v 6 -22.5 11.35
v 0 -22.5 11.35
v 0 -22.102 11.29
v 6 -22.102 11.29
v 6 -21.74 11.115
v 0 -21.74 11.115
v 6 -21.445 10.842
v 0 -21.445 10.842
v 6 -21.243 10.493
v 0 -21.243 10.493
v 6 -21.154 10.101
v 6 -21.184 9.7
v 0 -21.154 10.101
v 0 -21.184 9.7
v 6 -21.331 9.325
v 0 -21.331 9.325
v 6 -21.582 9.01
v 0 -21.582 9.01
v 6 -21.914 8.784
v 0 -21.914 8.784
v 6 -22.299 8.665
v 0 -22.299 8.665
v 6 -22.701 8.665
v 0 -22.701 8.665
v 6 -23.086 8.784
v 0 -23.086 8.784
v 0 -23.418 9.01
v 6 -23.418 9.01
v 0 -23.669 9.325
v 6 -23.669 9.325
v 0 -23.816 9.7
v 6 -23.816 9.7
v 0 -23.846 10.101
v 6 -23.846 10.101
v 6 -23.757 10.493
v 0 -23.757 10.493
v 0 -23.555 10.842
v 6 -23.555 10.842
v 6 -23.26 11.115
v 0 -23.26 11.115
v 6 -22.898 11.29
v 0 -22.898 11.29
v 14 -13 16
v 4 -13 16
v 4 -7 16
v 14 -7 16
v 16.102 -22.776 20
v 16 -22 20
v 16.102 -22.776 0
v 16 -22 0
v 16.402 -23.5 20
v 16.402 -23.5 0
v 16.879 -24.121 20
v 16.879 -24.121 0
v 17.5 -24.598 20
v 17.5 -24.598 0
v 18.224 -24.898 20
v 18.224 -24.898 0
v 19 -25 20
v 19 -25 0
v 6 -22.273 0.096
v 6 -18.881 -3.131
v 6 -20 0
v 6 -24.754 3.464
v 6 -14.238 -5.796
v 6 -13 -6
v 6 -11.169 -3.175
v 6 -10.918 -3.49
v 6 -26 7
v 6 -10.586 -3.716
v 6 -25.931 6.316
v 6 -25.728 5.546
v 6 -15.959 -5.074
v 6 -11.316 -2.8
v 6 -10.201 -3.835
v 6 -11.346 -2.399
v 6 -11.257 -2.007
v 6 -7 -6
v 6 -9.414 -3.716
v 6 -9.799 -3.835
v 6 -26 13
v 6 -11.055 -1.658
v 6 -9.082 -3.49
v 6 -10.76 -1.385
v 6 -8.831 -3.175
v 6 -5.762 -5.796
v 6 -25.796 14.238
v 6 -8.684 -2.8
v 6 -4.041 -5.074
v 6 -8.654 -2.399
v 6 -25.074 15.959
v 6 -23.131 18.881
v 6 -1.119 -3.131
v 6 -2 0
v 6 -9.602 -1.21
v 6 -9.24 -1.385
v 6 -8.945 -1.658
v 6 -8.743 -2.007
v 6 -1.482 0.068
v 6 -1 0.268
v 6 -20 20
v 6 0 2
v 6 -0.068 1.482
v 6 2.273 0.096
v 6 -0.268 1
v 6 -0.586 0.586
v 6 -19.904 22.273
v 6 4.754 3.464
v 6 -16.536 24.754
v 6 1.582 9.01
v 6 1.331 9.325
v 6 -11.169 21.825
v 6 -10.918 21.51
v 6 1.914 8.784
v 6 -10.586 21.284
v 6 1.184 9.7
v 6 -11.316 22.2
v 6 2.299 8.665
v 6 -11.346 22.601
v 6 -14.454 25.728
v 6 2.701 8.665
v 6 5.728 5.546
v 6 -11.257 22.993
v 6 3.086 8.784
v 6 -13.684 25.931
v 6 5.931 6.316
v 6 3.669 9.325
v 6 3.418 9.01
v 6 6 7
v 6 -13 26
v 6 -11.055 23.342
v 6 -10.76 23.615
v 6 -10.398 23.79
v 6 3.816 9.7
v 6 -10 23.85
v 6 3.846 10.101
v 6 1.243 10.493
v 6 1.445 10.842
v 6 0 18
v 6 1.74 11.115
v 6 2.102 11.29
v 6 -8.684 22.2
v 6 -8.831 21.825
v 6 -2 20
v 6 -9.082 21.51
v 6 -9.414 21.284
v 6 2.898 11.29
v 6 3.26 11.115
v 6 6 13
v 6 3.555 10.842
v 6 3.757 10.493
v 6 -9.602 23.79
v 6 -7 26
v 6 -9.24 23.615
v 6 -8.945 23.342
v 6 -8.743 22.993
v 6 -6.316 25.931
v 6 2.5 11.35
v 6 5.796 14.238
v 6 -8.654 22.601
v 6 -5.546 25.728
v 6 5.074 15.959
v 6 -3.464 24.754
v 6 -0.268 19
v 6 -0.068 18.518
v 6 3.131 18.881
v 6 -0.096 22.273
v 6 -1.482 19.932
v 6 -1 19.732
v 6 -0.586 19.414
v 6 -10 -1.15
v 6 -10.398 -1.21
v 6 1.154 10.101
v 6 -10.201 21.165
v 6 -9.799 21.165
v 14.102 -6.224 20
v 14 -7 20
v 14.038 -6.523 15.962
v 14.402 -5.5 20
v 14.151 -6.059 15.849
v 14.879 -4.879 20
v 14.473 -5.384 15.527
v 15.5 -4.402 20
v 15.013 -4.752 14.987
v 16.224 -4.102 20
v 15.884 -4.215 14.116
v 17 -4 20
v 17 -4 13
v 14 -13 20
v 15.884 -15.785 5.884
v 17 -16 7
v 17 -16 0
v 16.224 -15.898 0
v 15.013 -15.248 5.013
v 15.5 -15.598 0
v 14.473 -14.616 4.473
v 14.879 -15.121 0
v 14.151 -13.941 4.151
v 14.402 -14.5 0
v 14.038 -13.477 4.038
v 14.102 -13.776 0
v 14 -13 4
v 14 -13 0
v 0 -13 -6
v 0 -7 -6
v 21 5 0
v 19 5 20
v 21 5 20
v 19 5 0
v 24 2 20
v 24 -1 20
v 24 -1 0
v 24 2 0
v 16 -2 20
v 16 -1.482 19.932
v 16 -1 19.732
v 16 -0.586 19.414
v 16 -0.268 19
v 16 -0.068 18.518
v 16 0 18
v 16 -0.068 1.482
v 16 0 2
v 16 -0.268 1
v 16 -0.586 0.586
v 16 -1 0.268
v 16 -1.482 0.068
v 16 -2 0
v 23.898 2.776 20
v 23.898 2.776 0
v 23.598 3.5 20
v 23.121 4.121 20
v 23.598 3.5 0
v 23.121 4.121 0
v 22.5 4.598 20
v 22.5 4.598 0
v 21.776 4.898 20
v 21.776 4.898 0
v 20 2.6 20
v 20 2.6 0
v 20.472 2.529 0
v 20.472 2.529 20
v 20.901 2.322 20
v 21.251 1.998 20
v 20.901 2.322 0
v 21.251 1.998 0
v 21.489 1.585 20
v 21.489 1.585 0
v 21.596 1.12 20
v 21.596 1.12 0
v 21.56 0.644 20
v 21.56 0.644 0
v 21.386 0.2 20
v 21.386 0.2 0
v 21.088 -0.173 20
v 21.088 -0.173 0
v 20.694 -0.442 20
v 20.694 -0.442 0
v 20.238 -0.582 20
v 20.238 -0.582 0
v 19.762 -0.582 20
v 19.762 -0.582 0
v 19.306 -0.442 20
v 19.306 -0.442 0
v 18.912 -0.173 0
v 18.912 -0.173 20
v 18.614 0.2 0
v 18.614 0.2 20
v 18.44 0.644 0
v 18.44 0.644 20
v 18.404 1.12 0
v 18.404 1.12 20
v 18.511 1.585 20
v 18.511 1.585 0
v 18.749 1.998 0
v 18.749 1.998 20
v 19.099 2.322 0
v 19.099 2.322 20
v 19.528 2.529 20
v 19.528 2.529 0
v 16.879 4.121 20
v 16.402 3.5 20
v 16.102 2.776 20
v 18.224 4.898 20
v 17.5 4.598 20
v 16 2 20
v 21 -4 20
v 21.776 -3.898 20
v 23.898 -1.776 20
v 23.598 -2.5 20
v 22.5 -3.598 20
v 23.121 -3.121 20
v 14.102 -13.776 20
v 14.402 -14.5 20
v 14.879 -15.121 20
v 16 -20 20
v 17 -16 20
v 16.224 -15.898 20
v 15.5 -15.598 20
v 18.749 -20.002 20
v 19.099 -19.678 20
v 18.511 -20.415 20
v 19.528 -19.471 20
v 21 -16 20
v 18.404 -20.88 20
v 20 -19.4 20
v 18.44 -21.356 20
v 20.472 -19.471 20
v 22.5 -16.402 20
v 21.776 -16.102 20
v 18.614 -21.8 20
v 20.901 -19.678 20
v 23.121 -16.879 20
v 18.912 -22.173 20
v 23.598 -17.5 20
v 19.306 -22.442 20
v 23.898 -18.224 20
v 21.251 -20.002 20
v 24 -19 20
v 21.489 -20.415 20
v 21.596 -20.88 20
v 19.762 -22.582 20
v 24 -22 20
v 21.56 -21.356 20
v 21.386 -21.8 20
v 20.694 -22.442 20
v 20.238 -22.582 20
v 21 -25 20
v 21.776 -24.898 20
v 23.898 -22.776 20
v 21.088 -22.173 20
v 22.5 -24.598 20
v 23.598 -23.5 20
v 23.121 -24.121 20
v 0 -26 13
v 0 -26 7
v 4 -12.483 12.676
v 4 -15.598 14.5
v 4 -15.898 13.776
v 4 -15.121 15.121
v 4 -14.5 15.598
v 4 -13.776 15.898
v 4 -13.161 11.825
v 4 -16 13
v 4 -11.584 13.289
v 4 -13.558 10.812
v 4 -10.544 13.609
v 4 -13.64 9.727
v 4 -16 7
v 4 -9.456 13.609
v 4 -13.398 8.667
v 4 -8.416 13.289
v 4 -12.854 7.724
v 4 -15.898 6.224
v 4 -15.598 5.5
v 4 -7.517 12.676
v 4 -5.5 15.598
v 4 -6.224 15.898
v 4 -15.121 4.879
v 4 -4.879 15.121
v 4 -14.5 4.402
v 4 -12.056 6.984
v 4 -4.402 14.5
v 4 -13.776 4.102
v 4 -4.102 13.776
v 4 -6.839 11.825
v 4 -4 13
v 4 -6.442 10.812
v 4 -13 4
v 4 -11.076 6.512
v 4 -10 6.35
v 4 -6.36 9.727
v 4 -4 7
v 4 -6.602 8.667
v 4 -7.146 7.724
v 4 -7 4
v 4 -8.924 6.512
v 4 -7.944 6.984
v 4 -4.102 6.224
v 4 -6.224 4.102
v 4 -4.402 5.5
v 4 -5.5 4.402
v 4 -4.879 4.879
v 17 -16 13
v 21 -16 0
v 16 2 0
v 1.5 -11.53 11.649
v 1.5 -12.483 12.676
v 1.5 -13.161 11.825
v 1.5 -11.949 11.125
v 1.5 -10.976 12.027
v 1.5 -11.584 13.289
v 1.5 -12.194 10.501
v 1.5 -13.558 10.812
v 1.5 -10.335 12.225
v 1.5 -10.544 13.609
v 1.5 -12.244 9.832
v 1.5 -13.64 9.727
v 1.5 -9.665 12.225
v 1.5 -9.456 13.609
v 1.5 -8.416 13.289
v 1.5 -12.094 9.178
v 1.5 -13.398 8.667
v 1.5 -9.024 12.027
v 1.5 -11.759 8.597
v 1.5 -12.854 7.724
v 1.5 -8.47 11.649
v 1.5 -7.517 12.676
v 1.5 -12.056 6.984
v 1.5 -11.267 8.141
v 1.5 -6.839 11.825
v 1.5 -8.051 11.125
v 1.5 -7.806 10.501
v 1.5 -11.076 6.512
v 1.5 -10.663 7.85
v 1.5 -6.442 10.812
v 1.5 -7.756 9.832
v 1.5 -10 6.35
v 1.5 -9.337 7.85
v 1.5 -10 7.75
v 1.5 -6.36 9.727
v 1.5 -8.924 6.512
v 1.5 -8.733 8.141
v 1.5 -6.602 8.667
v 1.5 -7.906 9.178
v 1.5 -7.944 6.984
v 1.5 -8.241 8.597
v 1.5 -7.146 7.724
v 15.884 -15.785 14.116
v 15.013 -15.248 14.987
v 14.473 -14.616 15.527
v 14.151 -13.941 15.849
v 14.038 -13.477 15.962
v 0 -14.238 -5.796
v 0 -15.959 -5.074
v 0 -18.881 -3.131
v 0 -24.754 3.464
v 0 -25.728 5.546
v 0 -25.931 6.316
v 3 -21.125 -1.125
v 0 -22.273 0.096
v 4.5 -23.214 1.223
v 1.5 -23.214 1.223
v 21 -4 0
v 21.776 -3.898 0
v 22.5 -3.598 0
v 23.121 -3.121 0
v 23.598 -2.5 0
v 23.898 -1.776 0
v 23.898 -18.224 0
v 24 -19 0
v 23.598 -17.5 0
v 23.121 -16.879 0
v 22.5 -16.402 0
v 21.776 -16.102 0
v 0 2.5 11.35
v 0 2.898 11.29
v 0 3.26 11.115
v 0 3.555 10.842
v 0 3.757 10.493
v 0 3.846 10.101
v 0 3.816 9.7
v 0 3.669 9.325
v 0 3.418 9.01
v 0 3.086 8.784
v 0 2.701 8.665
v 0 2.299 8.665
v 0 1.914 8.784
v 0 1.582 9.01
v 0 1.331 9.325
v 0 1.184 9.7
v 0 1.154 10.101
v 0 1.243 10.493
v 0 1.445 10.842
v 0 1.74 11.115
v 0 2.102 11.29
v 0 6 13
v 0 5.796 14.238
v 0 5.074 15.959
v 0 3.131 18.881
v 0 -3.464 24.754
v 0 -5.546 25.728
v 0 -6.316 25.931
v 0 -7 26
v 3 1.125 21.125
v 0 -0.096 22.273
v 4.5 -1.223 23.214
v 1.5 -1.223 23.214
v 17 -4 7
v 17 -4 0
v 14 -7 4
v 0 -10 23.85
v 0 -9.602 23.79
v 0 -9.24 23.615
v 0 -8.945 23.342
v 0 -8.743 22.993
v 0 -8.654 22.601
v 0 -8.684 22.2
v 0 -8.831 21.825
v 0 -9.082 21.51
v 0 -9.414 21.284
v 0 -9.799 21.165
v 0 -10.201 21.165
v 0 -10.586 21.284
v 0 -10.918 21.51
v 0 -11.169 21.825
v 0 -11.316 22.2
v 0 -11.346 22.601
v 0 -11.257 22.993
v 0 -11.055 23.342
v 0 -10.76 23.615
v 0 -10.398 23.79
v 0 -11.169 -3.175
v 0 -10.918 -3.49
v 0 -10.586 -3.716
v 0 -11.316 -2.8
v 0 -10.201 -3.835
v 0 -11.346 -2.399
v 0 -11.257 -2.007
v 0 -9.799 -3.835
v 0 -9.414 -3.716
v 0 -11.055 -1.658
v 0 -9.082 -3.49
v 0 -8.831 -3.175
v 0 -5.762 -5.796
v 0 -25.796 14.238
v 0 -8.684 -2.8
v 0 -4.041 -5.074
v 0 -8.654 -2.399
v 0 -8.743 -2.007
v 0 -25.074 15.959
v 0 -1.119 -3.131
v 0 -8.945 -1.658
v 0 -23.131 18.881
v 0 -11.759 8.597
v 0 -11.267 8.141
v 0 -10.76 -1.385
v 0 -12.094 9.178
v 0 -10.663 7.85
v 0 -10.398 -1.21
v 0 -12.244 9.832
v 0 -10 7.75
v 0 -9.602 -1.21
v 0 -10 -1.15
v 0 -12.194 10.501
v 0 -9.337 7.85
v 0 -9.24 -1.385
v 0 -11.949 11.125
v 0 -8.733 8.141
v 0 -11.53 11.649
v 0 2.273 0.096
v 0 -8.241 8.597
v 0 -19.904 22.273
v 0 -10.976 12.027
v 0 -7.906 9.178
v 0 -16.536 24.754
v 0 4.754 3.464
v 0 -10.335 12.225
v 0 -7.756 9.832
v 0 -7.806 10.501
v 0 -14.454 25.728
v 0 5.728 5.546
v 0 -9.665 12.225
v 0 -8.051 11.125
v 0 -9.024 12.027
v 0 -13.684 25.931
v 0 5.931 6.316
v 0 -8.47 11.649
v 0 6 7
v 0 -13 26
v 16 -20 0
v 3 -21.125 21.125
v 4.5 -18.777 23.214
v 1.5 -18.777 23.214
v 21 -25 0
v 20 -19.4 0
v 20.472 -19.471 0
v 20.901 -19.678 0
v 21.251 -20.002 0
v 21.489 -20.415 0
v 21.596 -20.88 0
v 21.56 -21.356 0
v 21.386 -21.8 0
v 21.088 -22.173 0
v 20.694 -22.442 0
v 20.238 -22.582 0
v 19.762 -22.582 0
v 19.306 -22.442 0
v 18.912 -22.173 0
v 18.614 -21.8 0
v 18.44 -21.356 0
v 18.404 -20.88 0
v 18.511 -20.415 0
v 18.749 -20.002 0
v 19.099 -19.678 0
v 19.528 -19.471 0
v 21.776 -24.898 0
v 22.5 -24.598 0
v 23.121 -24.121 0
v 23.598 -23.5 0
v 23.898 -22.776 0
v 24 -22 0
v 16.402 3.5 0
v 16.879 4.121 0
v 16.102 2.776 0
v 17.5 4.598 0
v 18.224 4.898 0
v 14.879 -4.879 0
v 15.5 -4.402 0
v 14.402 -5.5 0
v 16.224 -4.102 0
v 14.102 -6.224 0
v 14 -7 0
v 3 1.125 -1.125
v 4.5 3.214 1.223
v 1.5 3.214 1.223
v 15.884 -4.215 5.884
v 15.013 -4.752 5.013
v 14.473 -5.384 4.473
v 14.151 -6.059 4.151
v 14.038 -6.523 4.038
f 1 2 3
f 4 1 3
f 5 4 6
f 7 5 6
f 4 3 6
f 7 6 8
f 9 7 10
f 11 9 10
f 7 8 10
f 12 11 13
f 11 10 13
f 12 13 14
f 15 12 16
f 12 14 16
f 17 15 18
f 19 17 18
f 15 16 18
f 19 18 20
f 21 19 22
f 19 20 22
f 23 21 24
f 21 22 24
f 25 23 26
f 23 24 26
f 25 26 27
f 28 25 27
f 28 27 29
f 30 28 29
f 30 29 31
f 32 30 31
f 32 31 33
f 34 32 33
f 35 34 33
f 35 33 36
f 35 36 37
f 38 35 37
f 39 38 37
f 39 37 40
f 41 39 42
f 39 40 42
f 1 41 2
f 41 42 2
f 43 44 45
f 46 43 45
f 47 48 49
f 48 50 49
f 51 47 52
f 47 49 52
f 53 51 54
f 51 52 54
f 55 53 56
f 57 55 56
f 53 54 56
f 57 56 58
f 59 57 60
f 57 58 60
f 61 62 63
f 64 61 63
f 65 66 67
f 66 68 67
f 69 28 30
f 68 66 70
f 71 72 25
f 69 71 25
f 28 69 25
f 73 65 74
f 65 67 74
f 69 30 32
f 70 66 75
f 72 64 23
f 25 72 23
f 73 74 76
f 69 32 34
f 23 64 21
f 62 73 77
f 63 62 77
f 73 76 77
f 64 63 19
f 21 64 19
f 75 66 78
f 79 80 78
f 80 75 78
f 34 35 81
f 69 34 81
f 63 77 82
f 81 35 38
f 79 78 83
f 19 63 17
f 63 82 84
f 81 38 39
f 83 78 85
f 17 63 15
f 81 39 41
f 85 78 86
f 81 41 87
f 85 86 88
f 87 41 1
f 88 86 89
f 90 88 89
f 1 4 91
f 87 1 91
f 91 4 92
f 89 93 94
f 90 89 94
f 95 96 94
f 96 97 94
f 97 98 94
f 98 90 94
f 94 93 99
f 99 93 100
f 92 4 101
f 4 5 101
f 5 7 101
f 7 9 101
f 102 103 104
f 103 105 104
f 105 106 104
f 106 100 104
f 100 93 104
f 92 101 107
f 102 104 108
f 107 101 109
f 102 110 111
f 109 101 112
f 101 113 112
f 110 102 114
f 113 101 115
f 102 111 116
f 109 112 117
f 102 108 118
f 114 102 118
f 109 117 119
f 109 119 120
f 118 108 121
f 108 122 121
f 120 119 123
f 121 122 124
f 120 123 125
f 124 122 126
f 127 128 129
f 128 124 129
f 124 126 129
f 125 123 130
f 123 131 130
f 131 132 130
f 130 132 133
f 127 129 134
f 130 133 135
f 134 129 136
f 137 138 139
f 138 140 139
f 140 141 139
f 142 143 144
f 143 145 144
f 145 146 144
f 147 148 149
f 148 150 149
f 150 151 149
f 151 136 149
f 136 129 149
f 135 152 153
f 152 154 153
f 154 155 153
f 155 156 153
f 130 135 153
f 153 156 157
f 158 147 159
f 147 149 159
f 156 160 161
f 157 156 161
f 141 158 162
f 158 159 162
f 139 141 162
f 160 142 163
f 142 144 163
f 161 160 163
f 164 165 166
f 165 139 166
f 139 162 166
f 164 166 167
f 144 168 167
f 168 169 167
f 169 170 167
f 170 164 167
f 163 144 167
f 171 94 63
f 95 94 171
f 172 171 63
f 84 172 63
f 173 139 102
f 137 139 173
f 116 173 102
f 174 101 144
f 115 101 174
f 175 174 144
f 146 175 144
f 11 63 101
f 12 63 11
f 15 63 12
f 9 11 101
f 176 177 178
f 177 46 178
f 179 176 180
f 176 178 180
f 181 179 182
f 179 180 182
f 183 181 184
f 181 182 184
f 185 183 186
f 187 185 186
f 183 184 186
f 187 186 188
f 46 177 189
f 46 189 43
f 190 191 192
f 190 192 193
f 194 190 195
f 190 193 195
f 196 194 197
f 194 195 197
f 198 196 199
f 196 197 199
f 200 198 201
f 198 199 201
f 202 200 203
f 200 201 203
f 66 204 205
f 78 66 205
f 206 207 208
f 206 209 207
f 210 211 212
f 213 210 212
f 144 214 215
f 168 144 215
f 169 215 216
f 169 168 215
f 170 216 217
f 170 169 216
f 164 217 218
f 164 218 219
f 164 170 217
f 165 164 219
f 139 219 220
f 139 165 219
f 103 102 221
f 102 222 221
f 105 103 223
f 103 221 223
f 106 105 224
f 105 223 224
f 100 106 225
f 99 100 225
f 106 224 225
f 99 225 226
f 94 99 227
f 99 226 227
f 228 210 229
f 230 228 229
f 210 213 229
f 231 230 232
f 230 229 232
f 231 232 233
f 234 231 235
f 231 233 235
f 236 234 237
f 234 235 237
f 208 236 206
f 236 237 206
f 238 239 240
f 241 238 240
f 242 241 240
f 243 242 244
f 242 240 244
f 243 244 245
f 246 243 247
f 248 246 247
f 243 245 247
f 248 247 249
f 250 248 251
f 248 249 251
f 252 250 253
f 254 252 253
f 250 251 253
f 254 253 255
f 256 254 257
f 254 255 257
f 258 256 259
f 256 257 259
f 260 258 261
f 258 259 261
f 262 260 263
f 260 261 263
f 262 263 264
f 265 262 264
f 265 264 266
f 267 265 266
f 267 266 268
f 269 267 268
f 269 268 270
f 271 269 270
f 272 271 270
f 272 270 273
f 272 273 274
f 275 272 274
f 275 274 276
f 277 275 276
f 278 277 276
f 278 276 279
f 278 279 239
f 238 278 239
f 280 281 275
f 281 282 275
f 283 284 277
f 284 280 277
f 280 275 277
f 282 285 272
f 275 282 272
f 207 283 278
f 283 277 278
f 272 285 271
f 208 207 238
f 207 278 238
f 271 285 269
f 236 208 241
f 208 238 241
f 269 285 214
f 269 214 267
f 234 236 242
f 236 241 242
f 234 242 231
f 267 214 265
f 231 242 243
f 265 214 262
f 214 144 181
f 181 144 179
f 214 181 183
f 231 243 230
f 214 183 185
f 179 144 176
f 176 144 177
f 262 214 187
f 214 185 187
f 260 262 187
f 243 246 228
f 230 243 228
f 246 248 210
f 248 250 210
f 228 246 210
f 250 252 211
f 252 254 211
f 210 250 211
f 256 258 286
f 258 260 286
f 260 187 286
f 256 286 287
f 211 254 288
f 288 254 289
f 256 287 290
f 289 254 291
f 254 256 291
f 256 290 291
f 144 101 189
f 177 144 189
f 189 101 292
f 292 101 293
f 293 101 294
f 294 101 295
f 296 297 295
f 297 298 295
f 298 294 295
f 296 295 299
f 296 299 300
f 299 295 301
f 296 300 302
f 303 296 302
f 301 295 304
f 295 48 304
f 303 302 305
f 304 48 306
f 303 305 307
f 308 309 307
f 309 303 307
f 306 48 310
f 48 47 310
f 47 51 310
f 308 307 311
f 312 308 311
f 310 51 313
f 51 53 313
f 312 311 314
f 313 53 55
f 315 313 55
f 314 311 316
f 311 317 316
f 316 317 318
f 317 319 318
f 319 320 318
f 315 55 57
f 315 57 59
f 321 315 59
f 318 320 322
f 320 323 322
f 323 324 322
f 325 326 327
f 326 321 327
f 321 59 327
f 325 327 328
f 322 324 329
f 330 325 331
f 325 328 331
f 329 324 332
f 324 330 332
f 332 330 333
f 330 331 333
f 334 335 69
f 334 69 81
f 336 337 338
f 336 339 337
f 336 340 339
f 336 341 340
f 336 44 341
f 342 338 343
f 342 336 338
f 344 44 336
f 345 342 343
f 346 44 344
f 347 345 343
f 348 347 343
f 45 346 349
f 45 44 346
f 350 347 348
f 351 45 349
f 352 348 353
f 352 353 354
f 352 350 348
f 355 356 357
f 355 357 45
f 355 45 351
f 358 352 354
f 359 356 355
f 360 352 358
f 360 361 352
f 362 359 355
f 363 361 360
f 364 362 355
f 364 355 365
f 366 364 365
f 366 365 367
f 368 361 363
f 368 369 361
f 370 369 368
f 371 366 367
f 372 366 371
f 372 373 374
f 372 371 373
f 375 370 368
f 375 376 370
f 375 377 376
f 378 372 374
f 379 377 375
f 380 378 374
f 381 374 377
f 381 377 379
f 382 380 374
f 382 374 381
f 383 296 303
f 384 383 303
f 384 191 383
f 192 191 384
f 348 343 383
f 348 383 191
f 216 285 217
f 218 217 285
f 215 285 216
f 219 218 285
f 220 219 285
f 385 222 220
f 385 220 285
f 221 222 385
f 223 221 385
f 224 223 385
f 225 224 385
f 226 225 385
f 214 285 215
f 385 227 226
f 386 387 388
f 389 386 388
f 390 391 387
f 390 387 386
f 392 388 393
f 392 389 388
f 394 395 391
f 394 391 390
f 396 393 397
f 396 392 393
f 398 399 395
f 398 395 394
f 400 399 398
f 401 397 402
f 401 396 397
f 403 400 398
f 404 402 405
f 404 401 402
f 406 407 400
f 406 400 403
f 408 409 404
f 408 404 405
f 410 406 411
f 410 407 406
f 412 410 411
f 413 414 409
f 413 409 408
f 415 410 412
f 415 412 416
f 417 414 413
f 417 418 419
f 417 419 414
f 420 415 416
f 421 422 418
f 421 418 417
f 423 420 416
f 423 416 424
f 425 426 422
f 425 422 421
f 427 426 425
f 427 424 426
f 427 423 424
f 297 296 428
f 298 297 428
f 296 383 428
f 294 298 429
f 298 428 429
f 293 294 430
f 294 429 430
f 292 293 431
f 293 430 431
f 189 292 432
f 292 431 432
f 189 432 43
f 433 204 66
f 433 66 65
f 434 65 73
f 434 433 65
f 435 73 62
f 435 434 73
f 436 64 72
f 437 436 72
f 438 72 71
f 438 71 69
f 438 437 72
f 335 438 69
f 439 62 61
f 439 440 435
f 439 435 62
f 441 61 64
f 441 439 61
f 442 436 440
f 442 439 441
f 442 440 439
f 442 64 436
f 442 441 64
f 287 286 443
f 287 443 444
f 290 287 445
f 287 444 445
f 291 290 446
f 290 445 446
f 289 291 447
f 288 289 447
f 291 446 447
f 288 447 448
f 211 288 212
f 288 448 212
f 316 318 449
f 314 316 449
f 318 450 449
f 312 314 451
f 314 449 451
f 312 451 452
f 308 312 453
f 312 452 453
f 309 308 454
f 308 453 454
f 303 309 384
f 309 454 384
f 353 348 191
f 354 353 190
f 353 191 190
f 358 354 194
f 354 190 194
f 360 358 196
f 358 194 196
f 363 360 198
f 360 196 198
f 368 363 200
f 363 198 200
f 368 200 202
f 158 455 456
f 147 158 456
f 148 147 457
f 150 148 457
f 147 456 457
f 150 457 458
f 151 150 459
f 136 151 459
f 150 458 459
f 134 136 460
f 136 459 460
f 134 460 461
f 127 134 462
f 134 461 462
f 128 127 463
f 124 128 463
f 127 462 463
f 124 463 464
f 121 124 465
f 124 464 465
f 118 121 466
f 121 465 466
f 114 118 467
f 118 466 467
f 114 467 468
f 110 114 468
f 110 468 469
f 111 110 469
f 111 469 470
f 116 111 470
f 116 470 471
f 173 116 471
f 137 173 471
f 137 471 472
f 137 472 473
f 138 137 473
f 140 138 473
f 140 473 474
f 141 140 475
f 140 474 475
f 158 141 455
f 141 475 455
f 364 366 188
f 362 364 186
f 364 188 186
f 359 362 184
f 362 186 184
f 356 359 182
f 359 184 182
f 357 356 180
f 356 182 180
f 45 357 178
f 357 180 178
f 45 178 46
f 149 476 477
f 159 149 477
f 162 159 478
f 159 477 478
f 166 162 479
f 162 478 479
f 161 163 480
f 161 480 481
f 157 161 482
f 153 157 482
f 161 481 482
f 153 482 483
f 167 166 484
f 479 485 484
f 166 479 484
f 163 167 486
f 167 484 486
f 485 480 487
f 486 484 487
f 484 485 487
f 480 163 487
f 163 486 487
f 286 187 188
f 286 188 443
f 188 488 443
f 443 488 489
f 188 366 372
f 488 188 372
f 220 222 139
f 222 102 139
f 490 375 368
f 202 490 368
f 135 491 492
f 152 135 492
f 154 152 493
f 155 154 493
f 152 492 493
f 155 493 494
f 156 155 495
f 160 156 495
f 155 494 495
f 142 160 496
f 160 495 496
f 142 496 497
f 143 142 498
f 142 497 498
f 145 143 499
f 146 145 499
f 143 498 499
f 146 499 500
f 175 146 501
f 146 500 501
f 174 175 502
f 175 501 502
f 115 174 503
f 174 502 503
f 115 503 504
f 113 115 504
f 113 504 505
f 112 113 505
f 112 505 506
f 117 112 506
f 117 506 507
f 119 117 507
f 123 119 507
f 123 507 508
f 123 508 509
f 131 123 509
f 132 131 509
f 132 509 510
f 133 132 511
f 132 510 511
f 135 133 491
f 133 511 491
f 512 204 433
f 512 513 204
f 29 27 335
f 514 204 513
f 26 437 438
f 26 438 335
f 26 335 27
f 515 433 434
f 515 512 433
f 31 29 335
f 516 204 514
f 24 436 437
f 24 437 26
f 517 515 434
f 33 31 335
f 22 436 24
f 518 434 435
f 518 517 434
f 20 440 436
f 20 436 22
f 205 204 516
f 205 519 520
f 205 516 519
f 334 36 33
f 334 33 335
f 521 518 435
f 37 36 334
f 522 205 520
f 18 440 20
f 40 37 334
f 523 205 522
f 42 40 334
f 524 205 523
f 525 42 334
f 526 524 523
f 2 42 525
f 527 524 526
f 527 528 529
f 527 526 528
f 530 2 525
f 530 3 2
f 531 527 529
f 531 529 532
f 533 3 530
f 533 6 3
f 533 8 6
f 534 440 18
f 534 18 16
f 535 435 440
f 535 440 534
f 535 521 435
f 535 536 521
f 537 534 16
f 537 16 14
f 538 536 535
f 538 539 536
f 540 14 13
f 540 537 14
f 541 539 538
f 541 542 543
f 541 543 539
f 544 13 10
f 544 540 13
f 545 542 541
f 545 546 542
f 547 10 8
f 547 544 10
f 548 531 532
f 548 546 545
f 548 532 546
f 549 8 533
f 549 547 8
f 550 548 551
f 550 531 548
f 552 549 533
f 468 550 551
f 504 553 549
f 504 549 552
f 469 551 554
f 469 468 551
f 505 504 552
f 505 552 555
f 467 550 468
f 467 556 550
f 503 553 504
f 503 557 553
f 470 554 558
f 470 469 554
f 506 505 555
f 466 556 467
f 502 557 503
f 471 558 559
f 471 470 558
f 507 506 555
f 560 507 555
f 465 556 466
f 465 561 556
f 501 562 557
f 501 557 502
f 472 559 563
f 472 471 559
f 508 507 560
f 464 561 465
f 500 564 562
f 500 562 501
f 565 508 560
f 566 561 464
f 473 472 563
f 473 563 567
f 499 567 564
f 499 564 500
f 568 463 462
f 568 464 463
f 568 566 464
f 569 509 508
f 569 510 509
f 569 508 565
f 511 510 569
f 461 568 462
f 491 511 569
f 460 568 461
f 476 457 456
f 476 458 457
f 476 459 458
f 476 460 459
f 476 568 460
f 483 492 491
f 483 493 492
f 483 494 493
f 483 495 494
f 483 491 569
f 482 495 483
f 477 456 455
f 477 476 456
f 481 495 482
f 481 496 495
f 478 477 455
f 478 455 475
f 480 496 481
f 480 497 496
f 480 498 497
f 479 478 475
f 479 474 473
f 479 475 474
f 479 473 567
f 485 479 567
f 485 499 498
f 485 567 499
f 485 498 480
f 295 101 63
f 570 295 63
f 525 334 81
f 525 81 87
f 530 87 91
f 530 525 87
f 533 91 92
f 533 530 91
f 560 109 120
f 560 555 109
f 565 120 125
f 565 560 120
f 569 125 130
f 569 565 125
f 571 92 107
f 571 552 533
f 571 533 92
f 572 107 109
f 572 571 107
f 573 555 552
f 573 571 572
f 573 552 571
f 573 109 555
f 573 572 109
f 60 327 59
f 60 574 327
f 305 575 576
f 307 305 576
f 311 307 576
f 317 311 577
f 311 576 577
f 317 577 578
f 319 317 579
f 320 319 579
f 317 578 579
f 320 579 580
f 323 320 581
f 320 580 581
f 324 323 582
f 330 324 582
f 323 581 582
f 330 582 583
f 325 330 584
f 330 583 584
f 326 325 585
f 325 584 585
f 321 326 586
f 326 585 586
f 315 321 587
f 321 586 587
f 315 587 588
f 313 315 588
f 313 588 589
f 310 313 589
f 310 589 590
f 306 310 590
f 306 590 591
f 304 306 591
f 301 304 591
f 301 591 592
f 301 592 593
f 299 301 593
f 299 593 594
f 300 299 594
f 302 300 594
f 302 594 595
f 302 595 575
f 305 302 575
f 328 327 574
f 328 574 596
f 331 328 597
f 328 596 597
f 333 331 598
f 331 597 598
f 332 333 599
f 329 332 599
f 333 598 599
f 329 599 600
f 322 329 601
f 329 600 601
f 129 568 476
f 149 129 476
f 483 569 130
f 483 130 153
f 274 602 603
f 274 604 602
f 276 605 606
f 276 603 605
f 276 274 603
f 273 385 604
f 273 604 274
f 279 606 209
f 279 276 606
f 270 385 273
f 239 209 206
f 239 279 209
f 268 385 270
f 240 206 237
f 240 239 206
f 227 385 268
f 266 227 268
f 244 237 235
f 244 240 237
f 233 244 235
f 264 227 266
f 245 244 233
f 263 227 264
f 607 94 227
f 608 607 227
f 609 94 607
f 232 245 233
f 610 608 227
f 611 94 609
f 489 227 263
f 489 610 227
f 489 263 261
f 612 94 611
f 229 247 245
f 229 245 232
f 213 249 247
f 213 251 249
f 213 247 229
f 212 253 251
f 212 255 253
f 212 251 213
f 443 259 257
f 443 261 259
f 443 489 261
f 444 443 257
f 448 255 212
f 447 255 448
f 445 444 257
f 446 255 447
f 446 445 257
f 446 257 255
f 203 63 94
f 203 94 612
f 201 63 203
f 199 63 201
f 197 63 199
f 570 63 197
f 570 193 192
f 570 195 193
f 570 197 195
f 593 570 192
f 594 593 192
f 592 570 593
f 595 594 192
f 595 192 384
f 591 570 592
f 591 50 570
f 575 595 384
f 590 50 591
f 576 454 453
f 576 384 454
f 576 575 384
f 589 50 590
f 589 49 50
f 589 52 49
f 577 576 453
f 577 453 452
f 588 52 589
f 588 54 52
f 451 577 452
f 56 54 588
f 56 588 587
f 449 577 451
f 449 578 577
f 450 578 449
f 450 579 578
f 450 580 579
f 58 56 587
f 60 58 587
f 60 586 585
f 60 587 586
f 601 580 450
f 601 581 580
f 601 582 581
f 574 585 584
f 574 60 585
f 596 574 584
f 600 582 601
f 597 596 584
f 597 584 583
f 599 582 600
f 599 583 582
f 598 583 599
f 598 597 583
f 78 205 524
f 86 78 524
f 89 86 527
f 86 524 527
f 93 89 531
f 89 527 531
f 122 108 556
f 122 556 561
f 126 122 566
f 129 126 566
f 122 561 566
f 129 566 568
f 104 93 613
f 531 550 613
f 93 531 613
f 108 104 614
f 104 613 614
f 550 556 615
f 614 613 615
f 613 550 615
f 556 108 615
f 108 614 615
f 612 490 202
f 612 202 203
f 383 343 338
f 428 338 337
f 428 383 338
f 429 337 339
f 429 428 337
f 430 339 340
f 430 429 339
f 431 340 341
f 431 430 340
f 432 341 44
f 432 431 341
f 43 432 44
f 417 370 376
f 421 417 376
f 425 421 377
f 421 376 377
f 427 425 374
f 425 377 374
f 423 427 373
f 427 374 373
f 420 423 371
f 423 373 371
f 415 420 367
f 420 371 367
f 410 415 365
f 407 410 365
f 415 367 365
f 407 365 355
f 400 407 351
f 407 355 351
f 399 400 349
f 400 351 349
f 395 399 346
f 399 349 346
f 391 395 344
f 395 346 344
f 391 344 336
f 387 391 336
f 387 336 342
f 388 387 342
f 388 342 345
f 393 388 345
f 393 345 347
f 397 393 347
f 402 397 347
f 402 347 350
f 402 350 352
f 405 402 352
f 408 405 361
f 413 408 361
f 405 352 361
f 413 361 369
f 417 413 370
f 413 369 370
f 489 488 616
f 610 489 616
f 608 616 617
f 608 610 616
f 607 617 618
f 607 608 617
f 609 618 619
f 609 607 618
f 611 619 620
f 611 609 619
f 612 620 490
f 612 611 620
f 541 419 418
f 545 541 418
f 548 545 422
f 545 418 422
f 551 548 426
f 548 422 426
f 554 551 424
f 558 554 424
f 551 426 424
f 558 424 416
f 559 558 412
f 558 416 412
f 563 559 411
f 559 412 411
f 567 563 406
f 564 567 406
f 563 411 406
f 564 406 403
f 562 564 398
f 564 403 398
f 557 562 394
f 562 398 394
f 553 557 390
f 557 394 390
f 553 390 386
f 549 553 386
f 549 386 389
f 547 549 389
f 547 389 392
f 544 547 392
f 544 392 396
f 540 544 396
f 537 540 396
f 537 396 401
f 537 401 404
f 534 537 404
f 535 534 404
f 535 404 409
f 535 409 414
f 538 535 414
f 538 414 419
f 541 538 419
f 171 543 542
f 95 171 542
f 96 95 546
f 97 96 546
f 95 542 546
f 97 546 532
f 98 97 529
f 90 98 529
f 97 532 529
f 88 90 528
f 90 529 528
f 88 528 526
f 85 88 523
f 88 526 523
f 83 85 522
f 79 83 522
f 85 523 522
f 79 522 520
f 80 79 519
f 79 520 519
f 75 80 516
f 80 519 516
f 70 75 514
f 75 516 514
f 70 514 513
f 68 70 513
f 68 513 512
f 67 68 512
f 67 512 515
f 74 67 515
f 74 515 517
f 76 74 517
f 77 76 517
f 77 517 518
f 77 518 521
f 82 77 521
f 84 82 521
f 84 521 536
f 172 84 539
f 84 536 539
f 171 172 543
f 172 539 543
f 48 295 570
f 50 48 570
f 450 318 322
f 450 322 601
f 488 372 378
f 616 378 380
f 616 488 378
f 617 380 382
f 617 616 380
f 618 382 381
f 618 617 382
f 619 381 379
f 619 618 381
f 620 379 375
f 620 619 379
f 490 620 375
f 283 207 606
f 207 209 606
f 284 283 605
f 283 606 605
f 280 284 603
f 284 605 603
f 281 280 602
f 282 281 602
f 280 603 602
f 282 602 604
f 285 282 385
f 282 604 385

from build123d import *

# Parameters (mm, degrees)
SKETCH1_W           = 20
SKETCH1_H           = 20
BOSS_EXTRUDE1_DEPTH = 4
SKETCH2_R           = 3.65
CUT_EXTRUDE1_DEPTH  = 2.5
SKETCH3_R           = 2.25
CUT_EXTRUDE2_DEPTH  = 29.394541729
SKETCH4_W           = 12
SKETCH4_H           = 4
BOSS_EXTRUDE2_DEPTH = 10
SKETCH7_W           = 20
SKETCH7_H           = 4
BOSS_EXTRUDE3_DEPTH = 10
SKETCH8_W           = 8
SKETCH8_H           = 20
BOSS_EXTRUDE4_DEPTH = 5
SKETCH9_W           = 8
SKETCH9_H           = 20
BOSS_EXTRUDE5_DEPTH = 5
SKETCH10_R          = 1.6
CUT_EXTRUDE5_DEPTH  = 41.012498047
SKETCH11_W          = 32
SKETCH11_H          = 32
SKETCH11_W_2        = 20
SKETCH11_H_2        = 20
BOSS_EXTRUDE6_DEPTH = 6
FILLET6_R           = 3
SKETCH13_R          = 1.35
CUT_EXTRUDE7_DEPTH  = 6
FILLET7_R           = 3
FILLET13_R          = 2
FILLET14_SIZE       = 13


with BuildPart() as part:
    # Sketch1 → Boss-Extrude1 (new body)
    with BuildSketch(Plane(origin=(0, 0, 0), x_dir=(0, 0, -1), z_dir=(1, 0, 0))):
        with Locations((-10, -10)):
            Rectangle(SKETCH1_W, SKETCH1_H)
    extrude(amount=BOSS_EXTRUDE1_DEPTH)

    # Sketch2 → Cut-Extrude1 (cut)
    with BuildSketch(Plane(origin=(4, 0, 0), x_dir=(0, 0, -1), z_dir=(1, 0, 0))):
        with Locations((-10, -10)):
            Circle(SKETCH2_R)
    extrude(amount=-CUT_EXTRUDE1_DEPTH, mode=Mode.SUBTRACT)

    # Sketch3 → Cut-Extrude2 (cut, through all)
    with BuildSketch(Plane(origin=(1.5, 0, 0), x_dir=(0, 0, -1), z_dir=(1, 0, 0))):
        with Locations((-10, -10)):
            Circle(SKETCH3_R)
    extrude(amount=-CUT_EXTRUDE2_DEPTH, mode=Mode.SUBTRACT)

    # Sketch4 → Boss-Extrude2 (add)
    with BuildSketch(Plane(origin=(4, 0, 0), x_dir=(0, 0, -1), z_dir=(1, 0, 0))):
        Polygon((-20, 0), (-20, -20), (-16, -20), (-16, -16), (-16, -4), (-16, 0), align=None)
        with Locations((-10, -18)):
            Rectangle(SKETCH4_W, SKETCH4_H)
        Polygon((-4, -16), (-4, -20), (0, -20), (0, -4), (-4, -4), align=None)
        Polygon((0, 0), (-16, 0), (-16, -4), (-4, -4), (0, -4), align=None)
    extrude(amount=BOSS_EXTRUDE2_DEPTH)

    # Sketch7 → Boss-Extrude3 (add)
    with BuildSketch(Plane(origin=(14, 0, 0), x_dir=(0, 0, -1), z_dir=(1, 0, 0))):
        with Locations((-10, -18)):
            Rectangle(SKETCH7_W, SKETCH7_H)
        with Locations((-10, -2)):
            Rectangle(SKETCH7_W, SKETCH7_H)
    extrude(amount=BOSS_EXTRUDE3_DEPTH)

    # Sketch8 → Boss-Extrude4 (add)
    with BuildSketch(Plane(origin=(0, -20, 0), x_dir=(-1, 0, 0), z_dir=(0, -1, 0))):
        with Locations((-20, -10)):
            Rectangle(SKETCH8_W, SKETCH8_H)
    extrude(amount=BOSS_EXTRUDE4_DEPTH)

    # Sketch9 → Boss-Extrude5 (add)
    with BuildSketch(Plane(origin=(0, 0, 0), x_dir=(1, 0, 0), z_dir=(0, 1, 0))):
        with Locations((20, -10)):
            Rectangle(SKETCH9_W, SKETCH9_H)
    extrude(amount=BOSS_EXTRUDE5_DEPTH)

    # Sketch10 → Cut-Extrude5 (cut, through all)
    with BuildSketch(Plane(origin=(0, 0, 0), x_dir=(-1, 0, 0), z_dir=(0, 0, -1))):
        with Locations(Location((-20, 1, 0), (0, 0, 90))):
            Circle(SKETCH10_R)
        with Locations(Location((-20, -21, 0), (0, 0, 90))):
            Circle(SKETCH10_R)
    extrude(amount=-CUT_EXTRUDE5_DEPTH, mode=Mode.SUBTRACT)

    # Sketch11 → Boss-Extrude6 (add)
    with BuildSketch(Plane.ZY):
        with Locations((10, -10)):
            Rectangle(SKETCH11_W, SKETCH11_H)
        with Locations((10, -10)):
            Rectangle(SKETCH11_W_2, SKETCH11_H_2, mode=Mode.SUBTRACT)
    extrude(amount=-BOSS_EXTRUDE6_DEPTH)

    # Fillet6
    fillet6_edges = [part.edges().sort_by_distance(p)[0] for p in [
        (24, -16, 10),
        (24, -4, 10),
        (24, -25, 10),
        (16, -25, 10),
        (24, 5, 10),
        (16, 5, 10),
    ]]
    fillet(fillet6_edges, radius=FILLET6_R)

    # Sketch13 → Cut-Extrude7 (cut)
    with BuildSketch(Plane.ZY):
        with Locations((22.5, -10)):
            Circle(SKETCH13_R)
        with Locations((10, 2.5)):
            Circle(SKETCH13_R)
        with Locations((-2.5, -10)):
            Circle(SKETCH13_R)
        with Locations((10, -22.5)):
            Circle(SKETCH13_R)
    extrude(amount=-CUT_EXTRUDE7_DEPTH, mode=Mode.SUBTRACT)

    # Fillet7
    fillet7_edges = [part.edges().sort_by_distance(p)[0] for p in [
        (9, -4, 16),
        (9, -4, 4),
        (9, -16, 4),
        (9, -16, 16),
        (14, -16, 18),
        (14, -16, 2),
        (14, -4, 2),
        (14, -4, 18),
    ]]
    fillet(fillet7_edges, radius=FILLET7_R)

    # Fillet13
    fillet13_edges = [part.edges().sort_by_distance(p)[0] for p in [
        (11, 0, 20),
        (11, 0, 0),
    ]]
    fillet(fillet13_edges, radius=FILLET13_R)

    # Fillet14
    # a fillet whose section is not a circle: 13 mm, written as the material it takes off along each edge
    with BuildSketch(Plane(origin=(0, -26, -6), x_dir=(0, 1, 0), z_dir=(1, 0, 0)), Plane(origin=(0, -26, 26), x_dir=(0, 0, -1), z_dir=(1, 0, 0))) as fillet14_piece_1:
        with BuildLine():
            Bezier((FILLET14_SIZE, 0), (0, 0), (0, FILLET14_SIZE), weights=[1, 0.333333333, 1])
            Line((0, FILLET14_SIZE), (-FILLET14_SIZE * 0.02, FILLET14_SIZE))
            Line((-FILLET14_SIZE * 0.02, FILLET14_SIZE), (-FILLET14_SIZE * 0.02, -FILLET14_SIZE * 0.02))
            Line((-FILLET14_SIZE * 0.02, -FILLET14_SIZE * 0.02), (FILLET14_SIZE, -FILLET14_SIZE * 0.02))
            Line((FILLET14_SIZE, -FILLET14_SIZE * 0.02), (FILLET14_SIZE, 0))
        make_face()
    extrude(amount=6, mode=Mode.SUBTRACT)
    with BuildSketch(Plane(origin=(0, 6, -6), x_dir=(0, -1, 0), z_dir=(1, 0, 0)), Plane(origin=(0, 6, 26), x_dir=(0, 0, -1), z_dir=(1, 0, 0))) as fillet14_piece_2:
        with BuildLine():
            Bezier((FILLET14_SIZE, 0), (0, 0), (0, -FILLET14_SIZE), weights=[1, 0.333333333, 1])
            Line((0, -FILLET14_SIZE), (-FILLET14_SIZE * 0.02, -FILLET14_SIZE))
            Line((-FILLET14_SIZE * 0.02, -FILLET14_SIZE), (-FILLET14_SIZE * 0.02, FILLET14_SIZE * 0.02))
            Line((-FILLET14_SIZE * 0.02, FILLET14_SIZE * 0.02), (FILLET14_SIZE, FILLET14_SIZE * 0.02))
            Line((FILLET14_SIZE, FILLET14_SIZE * 0.02), (FILLET14_SIZE, 0))
        make_face()
    extrude(amount=6, mode=Mode.SUBTRACT)


solid = part.part
